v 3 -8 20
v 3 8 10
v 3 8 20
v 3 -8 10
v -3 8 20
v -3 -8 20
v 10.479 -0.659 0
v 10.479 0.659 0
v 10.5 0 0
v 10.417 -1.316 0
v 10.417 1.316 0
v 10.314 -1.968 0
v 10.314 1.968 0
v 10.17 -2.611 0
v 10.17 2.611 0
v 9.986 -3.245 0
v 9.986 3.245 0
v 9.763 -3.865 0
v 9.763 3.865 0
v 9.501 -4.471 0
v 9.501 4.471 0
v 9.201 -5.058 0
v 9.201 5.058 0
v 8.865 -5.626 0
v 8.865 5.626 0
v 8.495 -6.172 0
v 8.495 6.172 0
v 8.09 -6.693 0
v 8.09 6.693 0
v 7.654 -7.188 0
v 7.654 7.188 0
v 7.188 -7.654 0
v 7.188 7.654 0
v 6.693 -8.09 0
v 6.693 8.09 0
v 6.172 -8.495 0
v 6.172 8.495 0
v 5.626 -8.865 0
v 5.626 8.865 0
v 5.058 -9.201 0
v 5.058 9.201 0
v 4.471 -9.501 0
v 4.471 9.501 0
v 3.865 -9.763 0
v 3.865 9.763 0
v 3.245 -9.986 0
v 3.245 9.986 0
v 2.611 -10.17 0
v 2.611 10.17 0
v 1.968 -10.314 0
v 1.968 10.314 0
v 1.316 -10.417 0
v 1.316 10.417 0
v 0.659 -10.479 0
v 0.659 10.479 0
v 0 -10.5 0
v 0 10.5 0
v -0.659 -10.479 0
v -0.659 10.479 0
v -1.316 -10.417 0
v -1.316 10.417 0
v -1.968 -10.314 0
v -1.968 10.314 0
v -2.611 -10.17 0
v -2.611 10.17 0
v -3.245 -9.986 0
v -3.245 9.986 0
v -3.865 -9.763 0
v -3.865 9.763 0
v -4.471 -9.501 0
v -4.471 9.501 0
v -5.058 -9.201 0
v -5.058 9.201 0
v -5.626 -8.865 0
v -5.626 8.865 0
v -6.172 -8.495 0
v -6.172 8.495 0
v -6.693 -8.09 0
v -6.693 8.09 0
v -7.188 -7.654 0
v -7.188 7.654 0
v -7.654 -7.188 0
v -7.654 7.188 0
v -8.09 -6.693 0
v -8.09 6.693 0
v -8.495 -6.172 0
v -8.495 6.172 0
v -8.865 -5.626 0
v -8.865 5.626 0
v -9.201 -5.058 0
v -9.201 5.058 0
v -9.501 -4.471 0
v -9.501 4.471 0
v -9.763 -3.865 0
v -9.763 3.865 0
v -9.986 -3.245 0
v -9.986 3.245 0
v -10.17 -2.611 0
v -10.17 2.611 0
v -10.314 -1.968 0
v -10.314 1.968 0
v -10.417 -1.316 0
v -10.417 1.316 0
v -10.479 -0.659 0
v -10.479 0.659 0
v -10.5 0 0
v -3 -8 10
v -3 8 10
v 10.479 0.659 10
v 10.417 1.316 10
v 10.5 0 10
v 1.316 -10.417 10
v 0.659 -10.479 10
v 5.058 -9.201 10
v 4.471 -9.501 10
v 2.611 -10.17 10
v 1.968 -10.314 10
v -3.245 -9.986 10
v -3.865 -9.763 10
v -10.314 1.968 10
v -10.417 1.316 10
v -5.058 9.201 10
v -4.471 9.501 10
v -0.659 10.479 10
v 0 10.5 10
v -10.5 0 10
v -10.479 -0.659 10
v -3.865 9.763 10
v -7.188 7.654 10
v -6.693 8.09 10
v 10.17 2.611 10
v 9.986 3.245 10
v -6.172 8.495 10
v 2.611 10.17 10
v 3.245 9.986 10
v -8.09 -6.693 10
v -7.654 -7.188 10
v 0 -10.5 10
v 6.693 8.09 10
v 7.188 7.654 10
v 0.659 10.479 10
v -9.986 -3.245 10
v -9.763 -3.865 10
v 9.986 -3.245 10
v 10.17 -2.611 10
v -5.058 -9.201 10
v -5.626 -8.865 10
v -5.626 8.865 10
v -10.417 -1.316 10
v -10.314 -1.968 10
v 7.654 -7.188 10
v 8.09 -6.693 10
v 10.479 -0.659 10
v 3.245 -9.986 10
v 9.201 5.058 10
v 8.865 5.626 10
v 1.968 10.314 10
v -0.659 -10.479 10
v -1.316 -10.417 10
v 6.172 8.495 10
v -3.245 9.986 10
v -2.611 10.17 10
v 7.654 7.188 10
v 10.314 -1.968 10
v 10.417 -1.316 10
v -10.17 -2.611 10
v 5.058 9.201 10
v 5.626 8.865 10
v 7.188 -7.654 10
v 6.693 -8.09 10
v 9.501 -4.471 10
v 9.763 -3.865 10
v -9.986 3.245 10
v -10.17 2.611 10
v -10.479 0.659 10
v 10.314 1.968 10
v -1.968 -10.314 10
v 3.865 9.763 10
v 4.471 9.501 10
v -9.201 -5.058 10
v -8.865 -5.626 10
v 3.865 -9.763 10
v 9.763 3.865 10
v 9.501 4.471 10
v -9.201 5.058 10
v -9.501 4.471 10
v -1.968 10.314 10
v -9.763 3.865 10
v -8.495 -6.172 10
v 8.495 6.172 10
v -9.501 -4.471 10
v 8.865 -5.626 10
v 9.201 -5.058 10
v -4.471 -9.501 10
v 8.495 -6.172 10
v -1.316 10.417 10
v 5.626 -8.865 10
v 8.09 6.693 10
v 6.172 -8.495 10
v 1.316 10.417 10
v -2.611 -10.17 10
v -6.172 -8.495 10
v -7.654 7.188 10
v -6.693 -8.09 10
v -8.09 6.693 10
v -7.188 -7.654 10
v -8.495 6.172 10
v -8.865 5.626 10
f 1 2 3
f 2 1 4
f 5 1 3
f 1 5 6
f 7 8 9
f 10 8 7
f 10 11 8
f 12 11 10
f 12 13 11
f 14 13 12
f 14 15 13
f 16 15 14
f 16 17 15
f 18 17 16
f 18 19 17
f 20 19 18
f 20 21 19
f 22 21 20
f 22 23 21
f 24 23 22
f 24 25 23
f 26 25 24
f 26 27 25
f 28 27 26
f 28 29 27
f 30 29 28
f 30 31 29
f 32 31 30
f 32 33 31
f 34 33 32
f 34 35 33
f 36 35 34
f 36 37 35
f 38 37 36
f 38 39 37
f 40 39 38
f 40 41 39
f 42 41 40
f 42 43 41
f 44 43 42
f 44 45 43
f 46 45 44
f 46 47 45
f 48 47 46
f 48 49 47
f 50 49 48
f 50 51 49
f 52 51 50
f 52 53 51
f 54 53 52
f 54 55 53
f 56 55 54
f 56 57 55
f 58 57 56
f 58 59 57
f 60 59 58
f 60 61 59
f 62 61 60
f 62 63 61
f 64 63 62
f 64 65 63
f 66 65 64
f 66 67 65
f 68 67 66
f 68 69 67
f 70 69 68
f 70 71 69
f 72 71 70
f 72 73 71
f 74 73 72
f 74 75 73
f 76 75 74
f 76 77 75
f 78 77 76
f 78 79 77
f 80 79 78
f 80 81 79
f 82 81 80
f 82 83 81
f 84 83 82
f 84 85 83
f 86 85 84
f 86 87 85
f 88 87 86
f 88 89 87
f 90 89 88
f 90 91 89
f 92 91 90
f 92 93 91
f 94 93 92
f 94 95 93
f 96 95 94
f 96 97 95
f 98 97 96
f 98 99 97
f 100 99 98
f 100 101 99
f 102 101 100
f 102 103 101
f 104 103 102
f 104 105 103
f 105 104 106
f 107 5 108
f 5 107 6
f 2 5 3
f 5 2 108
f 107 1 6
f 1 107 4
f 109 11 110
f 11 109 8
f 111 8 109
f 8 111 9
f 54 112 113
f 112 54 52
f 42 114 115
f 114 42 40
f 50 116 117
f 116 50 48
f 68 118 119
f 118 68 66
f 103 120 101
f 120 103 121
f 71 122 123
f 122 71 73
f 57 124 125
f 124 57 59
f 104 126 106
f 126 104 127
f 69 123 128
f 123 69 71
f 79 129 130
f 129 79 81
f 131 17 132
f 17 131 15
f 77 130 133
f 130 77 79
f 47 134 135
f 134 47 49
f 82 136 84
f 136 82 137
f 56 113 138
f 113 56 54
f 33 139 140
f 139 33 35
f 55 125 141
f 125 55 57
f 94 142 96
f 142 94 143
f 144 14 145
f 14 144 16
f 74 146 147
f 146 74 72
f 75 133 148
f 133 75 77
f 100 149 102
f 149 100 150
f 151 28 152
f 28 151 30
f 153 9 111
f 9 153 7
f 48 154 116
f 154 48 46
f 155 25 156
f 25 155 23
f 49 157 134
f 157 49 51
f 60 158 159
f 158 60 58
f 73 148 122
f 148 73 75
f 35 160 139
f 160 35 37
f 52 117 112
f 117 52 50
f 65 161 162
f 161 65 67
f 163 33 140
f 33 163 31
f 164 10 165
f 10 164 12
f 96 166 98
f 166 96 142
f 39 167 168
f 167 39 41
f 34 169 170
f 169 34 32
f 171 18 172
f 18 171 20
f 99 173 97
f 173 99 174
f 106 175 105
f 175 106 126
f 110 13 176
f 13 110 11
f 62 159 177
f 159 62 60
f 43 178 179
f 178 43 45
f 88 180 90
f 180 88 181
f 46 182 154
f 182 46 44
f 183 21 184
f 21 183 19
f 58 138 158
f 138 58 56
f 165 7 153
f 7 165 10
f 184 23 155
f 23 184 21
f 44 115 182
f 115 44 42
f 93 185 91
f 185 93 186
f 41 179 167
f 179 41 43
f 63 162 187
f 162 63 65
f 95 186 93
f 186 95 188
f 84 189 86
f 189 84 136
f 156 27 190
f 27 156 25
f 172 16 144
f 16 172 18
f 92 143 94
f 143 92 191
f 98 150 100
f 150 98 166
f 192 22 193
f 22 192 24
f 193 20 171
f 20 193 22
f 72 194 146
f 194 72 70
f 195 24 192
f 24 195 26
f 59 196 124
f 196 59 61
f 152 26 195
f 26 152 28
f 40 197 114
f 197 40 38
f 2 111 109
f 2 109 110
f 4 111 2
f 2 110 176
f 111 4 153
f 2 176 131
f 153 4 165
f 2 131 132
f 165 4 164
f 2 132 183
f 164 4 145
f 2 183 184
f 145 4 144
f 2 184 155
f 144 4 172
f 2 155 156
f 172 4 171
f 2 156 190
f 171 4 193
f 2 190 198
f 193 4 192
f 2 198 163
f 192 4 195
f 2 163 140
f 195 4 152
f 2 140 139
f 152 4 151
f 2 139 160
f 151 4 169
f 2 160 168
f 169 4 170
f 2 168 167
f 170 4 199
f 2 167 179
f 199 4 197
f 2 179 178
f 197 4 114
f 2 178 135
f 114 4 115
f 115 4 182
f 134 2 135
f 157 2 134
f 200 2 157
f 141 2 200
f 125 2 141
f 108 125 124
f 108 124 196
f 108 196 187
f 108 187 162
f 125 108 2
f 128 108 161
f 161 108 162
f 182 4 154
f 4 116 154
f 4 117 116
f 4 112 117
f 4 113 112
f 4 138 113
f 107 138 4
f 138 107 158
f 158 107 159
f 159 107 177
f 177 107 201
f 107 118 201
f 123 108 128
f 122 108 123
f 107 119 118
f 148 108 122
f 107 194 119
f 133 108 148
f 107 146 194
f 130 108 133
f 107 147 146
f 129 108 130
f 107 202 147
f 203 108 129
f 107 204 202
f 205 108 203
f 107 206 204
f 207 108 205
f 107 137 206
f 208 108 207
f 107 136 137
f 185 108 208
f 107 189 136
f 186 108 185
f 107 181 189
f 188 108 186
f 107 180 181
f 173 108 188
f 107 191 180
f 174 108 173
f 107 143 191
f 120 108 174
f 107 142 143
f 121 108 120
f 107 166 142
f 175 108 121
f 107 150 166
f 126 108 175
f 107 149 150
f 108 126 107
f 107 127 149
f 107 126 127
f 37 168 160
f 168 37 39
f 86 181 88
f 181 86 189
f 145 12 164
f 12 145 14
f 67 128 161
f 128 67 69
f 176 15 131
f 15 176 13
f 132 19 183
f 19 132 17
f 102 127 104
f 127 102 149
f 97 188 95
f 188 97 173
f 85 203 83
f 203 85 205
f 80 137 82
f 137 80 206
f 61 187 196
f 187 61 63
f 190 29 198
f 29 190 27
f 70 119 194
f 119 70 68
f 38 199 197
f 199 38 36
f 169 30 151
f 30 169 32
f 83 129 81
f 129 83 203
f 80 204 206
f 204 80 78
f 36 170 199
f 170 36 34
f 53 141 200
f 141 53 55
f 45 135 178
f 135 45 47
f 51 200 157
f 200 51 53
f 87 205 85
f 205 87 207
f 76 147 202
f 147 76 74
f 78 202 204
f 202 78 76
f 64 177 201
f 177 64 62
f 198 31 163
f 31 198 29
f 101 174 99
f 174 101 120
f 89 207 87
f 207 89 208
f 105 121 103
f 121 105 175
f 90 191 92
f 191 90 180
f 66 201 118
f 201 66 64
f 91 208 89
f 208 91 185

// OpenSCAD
$fn=100;

translate([0,0,10])cube([6,16,20], center=true);
cylinder(d=21,h=10);
